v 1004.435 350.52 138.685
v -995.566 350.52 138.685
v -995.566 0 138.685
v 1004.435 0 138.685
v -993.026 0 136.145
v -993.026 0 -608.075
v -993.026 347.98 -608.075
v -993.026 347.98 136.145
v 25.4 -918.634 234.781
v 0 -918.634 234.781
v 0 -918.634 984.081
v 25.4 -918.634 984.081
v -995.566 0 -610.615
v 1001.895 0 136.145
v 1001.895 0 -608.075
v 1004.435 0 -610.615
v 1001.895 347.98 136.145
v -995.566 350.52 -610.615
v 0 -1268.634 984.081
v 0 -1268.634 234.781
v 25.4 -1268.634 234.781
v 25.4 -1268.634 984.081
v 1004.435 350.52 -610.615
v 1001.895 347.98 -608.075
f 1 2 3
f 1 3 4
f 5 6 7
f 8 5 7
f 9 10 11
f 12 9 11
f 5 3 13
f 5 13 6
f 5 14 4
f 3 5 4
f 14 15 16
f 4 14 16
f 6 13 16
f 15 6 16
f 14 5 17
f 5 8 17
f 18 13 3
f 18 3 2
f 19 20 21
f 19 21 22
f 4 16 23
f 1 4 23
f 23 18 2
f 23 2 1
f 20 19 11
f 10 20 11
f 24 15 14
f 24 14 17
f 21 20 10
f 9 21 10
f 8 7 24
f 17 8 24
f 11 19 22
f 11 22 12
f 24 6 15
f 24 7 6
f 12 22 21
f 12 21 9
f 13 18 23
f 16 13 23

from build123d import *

# Parameters (mm, degrees)
F1_E0_TOP_W = 2000.00108
F1_E0_TOP_H = 350.52
F2_DEPTH    = 749.3
F3_T        = -2.54
F4_W        = 349.9993
F4_H        = 749.3
F5_DEPTH    = 25.4


with BuildPart() as f2:
    # F1_E0_top (on explicit) → F2 (new body)
    with BuildSketch(Plane(origin=(-995.5664890079, 0, -610.6151250599), x_dir=(1, 0, 0), z_dir=(0, 0, 1))):
        with Locations((1000.00054, 175.26)):
            Rectangle(F1_E0_TOP_W, F1_E0_TOP_H)
    extrude(amount=F2_DEPTH)

    # F3
    f3_openings = [f2.faces().sort_by_distance(p)[0] for p in [
        (4.434051, 0, -235.965125),
    ]]
    offset(amount=F3_T, openings=f3_openings)


with BuildPart() as f5:
    # F4 (on Right) → F5 (new body)
    with BuildSketch(Plane.YZ):
        with Locations((-1093.6340689659, 609.4311486613)):
            Rectangle(F4_W, F4_H)
    extrude(amount=F5_DEPTH)


solid = Compound([f2.part, f5.part])
